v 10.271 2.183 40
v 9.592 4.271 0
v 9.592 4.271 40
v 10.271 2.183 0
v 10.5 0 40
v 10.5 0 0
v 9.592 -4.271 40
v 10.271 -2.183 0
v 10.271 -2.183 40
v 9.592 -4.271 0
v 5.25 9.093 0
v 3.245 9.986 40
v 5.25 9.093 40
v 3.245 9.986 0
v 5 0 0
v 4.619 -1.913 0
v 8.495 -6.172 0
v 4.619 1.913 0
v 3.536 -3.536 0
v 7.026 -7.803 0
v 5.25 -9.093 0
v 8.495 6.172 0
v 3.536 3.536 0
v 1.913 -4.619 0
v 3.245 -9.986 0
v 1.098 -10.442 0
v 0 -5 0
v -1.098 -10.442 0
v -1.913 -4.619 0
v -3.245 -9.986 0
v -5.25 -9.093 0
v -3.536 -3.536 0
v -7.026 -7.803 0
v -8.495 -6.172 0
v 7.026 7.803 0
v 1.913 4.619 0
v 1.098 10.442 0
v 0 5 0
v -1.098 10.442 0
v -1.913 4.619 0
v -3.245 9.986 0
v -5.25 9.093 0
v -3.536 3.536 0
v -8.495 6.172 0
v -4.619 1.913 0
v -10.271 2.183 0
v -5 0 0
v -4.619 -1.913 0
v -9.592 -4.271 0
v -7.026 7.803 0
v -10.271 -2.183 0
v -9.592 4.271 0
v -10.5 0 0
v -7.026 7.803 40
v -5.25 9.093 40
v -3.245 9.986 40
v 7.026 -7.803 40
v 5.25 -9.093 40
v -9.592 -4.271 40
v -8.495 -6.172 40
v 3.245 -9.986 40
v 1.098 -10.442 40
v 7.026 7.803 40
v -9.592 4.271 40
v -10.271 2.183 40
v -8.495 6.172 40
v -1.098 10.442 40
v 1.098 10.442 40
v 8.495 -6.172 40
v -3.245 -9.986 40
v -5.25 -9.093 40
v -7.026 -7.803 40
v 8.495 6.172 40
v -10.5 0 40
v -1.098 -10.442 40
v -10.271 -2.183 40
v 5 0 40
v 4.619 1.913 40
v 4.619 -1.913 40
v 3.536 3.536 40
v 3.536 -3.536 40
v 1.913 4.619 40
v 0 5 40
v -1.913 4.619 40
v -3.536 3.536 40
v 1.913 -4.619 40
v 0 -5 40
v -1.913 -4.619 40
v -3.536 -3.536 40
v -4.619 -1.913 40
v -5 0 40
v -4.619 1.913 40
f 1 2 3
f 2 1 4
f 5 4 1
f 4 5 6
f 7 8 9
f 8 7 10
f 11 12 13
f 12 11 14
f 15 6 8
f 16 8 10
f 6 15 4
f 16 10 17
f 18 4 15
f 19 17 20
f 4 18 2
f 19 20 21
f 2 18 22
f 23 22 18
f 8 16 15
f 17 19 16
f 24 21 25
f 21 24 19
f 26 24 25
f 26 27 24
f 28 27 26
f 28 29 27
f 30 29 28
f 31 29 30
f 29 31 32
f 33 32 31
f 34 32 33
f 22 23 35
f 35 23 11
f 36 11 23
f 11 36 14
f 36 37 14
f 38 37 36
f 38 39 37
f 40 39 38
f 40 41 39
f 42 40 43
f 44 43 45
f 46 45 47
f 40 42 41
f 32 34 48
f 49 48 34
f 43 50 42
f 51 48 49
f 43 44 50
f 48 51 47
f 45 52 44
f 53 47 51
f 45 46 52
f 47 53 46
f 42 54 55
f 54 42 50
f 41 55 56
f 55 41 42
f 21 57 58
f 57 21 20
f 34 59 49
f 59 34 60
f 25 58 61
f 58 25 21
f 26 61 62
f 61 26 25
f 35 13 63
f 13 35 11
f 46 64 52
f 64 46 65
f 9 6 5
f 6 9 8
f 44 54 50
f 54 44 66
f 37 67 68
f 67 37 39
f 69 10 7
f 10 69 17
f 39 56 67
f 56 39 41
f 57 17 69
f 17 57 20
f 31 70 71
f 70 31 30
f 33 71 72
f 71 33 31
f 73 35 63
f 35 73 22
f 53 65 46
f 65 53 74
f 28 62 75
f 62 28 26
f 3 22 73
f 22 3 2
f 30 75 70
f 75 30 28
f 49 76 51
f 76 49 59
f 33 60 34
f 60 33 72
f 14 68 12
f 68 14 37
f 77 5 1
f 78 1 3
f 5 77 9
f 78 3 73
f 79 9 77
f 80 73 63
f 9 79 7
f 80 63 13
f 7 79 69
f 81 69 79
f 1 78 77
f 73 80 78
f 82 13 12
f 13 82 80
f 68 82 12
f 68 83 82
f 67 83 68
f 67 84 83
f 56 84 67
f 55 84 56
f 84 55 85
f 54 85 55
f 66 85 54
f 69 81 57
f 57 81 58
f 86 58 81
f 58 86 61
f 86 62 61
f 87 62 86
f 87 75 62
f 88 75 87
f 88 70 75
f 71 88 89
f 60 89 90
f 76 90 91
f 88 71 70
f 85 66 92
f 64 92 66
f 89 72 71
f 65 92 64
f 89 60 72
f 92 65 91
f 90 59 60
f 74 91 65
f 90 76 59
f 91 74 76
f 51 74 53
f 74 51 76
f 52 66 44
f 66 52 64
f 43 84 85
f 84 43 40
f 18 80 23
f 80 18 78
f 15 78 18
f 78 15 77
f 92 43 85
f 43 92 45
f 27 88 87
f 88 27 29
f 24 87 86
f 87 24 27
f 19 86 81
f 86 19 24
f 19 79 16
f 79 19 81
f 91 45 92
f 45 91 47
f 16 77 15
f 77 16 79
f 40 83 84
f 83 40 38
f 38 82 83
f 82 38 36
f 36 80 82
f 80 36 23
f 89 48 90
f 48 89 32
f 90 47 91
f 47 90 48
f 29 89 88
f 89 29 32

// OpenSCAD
// file: Parameters.scad
//Main tube diameter [mm]
main_tube_outer_diameter = 25;
main_tube_inner_diameter = 21;

//Tube for undercarriage [mm]
tube_for_undercarriage_outer_diameter = 10;
tube_for_undercarriage_inner_diameter = 5;

//Screw diameter and nut for M4 [mm]
M4_screw_diameter=4.5;
Nut_height_M4 = 3.2;
Nut_diameter_M4 = 7.66;


//Screw diameter and nut for M3 [mm]
M3_screw_diameter = 3.2;
Nut_height_M3 = 1.7;
Nut_diameter_M3 = 6.05;
// main file
include <./Parameters.scad>
height = 40;

difference (){

cylinder (h = height, r1 = main_tube_inner_diameter/2, r2 = main_tube_inner_diameter/2);
cylinder (h= height, r1 = tube_for_undercarriage_outer_diameter/2, r2 = tube_for_undercarriage_outer_diameter/2);

}
